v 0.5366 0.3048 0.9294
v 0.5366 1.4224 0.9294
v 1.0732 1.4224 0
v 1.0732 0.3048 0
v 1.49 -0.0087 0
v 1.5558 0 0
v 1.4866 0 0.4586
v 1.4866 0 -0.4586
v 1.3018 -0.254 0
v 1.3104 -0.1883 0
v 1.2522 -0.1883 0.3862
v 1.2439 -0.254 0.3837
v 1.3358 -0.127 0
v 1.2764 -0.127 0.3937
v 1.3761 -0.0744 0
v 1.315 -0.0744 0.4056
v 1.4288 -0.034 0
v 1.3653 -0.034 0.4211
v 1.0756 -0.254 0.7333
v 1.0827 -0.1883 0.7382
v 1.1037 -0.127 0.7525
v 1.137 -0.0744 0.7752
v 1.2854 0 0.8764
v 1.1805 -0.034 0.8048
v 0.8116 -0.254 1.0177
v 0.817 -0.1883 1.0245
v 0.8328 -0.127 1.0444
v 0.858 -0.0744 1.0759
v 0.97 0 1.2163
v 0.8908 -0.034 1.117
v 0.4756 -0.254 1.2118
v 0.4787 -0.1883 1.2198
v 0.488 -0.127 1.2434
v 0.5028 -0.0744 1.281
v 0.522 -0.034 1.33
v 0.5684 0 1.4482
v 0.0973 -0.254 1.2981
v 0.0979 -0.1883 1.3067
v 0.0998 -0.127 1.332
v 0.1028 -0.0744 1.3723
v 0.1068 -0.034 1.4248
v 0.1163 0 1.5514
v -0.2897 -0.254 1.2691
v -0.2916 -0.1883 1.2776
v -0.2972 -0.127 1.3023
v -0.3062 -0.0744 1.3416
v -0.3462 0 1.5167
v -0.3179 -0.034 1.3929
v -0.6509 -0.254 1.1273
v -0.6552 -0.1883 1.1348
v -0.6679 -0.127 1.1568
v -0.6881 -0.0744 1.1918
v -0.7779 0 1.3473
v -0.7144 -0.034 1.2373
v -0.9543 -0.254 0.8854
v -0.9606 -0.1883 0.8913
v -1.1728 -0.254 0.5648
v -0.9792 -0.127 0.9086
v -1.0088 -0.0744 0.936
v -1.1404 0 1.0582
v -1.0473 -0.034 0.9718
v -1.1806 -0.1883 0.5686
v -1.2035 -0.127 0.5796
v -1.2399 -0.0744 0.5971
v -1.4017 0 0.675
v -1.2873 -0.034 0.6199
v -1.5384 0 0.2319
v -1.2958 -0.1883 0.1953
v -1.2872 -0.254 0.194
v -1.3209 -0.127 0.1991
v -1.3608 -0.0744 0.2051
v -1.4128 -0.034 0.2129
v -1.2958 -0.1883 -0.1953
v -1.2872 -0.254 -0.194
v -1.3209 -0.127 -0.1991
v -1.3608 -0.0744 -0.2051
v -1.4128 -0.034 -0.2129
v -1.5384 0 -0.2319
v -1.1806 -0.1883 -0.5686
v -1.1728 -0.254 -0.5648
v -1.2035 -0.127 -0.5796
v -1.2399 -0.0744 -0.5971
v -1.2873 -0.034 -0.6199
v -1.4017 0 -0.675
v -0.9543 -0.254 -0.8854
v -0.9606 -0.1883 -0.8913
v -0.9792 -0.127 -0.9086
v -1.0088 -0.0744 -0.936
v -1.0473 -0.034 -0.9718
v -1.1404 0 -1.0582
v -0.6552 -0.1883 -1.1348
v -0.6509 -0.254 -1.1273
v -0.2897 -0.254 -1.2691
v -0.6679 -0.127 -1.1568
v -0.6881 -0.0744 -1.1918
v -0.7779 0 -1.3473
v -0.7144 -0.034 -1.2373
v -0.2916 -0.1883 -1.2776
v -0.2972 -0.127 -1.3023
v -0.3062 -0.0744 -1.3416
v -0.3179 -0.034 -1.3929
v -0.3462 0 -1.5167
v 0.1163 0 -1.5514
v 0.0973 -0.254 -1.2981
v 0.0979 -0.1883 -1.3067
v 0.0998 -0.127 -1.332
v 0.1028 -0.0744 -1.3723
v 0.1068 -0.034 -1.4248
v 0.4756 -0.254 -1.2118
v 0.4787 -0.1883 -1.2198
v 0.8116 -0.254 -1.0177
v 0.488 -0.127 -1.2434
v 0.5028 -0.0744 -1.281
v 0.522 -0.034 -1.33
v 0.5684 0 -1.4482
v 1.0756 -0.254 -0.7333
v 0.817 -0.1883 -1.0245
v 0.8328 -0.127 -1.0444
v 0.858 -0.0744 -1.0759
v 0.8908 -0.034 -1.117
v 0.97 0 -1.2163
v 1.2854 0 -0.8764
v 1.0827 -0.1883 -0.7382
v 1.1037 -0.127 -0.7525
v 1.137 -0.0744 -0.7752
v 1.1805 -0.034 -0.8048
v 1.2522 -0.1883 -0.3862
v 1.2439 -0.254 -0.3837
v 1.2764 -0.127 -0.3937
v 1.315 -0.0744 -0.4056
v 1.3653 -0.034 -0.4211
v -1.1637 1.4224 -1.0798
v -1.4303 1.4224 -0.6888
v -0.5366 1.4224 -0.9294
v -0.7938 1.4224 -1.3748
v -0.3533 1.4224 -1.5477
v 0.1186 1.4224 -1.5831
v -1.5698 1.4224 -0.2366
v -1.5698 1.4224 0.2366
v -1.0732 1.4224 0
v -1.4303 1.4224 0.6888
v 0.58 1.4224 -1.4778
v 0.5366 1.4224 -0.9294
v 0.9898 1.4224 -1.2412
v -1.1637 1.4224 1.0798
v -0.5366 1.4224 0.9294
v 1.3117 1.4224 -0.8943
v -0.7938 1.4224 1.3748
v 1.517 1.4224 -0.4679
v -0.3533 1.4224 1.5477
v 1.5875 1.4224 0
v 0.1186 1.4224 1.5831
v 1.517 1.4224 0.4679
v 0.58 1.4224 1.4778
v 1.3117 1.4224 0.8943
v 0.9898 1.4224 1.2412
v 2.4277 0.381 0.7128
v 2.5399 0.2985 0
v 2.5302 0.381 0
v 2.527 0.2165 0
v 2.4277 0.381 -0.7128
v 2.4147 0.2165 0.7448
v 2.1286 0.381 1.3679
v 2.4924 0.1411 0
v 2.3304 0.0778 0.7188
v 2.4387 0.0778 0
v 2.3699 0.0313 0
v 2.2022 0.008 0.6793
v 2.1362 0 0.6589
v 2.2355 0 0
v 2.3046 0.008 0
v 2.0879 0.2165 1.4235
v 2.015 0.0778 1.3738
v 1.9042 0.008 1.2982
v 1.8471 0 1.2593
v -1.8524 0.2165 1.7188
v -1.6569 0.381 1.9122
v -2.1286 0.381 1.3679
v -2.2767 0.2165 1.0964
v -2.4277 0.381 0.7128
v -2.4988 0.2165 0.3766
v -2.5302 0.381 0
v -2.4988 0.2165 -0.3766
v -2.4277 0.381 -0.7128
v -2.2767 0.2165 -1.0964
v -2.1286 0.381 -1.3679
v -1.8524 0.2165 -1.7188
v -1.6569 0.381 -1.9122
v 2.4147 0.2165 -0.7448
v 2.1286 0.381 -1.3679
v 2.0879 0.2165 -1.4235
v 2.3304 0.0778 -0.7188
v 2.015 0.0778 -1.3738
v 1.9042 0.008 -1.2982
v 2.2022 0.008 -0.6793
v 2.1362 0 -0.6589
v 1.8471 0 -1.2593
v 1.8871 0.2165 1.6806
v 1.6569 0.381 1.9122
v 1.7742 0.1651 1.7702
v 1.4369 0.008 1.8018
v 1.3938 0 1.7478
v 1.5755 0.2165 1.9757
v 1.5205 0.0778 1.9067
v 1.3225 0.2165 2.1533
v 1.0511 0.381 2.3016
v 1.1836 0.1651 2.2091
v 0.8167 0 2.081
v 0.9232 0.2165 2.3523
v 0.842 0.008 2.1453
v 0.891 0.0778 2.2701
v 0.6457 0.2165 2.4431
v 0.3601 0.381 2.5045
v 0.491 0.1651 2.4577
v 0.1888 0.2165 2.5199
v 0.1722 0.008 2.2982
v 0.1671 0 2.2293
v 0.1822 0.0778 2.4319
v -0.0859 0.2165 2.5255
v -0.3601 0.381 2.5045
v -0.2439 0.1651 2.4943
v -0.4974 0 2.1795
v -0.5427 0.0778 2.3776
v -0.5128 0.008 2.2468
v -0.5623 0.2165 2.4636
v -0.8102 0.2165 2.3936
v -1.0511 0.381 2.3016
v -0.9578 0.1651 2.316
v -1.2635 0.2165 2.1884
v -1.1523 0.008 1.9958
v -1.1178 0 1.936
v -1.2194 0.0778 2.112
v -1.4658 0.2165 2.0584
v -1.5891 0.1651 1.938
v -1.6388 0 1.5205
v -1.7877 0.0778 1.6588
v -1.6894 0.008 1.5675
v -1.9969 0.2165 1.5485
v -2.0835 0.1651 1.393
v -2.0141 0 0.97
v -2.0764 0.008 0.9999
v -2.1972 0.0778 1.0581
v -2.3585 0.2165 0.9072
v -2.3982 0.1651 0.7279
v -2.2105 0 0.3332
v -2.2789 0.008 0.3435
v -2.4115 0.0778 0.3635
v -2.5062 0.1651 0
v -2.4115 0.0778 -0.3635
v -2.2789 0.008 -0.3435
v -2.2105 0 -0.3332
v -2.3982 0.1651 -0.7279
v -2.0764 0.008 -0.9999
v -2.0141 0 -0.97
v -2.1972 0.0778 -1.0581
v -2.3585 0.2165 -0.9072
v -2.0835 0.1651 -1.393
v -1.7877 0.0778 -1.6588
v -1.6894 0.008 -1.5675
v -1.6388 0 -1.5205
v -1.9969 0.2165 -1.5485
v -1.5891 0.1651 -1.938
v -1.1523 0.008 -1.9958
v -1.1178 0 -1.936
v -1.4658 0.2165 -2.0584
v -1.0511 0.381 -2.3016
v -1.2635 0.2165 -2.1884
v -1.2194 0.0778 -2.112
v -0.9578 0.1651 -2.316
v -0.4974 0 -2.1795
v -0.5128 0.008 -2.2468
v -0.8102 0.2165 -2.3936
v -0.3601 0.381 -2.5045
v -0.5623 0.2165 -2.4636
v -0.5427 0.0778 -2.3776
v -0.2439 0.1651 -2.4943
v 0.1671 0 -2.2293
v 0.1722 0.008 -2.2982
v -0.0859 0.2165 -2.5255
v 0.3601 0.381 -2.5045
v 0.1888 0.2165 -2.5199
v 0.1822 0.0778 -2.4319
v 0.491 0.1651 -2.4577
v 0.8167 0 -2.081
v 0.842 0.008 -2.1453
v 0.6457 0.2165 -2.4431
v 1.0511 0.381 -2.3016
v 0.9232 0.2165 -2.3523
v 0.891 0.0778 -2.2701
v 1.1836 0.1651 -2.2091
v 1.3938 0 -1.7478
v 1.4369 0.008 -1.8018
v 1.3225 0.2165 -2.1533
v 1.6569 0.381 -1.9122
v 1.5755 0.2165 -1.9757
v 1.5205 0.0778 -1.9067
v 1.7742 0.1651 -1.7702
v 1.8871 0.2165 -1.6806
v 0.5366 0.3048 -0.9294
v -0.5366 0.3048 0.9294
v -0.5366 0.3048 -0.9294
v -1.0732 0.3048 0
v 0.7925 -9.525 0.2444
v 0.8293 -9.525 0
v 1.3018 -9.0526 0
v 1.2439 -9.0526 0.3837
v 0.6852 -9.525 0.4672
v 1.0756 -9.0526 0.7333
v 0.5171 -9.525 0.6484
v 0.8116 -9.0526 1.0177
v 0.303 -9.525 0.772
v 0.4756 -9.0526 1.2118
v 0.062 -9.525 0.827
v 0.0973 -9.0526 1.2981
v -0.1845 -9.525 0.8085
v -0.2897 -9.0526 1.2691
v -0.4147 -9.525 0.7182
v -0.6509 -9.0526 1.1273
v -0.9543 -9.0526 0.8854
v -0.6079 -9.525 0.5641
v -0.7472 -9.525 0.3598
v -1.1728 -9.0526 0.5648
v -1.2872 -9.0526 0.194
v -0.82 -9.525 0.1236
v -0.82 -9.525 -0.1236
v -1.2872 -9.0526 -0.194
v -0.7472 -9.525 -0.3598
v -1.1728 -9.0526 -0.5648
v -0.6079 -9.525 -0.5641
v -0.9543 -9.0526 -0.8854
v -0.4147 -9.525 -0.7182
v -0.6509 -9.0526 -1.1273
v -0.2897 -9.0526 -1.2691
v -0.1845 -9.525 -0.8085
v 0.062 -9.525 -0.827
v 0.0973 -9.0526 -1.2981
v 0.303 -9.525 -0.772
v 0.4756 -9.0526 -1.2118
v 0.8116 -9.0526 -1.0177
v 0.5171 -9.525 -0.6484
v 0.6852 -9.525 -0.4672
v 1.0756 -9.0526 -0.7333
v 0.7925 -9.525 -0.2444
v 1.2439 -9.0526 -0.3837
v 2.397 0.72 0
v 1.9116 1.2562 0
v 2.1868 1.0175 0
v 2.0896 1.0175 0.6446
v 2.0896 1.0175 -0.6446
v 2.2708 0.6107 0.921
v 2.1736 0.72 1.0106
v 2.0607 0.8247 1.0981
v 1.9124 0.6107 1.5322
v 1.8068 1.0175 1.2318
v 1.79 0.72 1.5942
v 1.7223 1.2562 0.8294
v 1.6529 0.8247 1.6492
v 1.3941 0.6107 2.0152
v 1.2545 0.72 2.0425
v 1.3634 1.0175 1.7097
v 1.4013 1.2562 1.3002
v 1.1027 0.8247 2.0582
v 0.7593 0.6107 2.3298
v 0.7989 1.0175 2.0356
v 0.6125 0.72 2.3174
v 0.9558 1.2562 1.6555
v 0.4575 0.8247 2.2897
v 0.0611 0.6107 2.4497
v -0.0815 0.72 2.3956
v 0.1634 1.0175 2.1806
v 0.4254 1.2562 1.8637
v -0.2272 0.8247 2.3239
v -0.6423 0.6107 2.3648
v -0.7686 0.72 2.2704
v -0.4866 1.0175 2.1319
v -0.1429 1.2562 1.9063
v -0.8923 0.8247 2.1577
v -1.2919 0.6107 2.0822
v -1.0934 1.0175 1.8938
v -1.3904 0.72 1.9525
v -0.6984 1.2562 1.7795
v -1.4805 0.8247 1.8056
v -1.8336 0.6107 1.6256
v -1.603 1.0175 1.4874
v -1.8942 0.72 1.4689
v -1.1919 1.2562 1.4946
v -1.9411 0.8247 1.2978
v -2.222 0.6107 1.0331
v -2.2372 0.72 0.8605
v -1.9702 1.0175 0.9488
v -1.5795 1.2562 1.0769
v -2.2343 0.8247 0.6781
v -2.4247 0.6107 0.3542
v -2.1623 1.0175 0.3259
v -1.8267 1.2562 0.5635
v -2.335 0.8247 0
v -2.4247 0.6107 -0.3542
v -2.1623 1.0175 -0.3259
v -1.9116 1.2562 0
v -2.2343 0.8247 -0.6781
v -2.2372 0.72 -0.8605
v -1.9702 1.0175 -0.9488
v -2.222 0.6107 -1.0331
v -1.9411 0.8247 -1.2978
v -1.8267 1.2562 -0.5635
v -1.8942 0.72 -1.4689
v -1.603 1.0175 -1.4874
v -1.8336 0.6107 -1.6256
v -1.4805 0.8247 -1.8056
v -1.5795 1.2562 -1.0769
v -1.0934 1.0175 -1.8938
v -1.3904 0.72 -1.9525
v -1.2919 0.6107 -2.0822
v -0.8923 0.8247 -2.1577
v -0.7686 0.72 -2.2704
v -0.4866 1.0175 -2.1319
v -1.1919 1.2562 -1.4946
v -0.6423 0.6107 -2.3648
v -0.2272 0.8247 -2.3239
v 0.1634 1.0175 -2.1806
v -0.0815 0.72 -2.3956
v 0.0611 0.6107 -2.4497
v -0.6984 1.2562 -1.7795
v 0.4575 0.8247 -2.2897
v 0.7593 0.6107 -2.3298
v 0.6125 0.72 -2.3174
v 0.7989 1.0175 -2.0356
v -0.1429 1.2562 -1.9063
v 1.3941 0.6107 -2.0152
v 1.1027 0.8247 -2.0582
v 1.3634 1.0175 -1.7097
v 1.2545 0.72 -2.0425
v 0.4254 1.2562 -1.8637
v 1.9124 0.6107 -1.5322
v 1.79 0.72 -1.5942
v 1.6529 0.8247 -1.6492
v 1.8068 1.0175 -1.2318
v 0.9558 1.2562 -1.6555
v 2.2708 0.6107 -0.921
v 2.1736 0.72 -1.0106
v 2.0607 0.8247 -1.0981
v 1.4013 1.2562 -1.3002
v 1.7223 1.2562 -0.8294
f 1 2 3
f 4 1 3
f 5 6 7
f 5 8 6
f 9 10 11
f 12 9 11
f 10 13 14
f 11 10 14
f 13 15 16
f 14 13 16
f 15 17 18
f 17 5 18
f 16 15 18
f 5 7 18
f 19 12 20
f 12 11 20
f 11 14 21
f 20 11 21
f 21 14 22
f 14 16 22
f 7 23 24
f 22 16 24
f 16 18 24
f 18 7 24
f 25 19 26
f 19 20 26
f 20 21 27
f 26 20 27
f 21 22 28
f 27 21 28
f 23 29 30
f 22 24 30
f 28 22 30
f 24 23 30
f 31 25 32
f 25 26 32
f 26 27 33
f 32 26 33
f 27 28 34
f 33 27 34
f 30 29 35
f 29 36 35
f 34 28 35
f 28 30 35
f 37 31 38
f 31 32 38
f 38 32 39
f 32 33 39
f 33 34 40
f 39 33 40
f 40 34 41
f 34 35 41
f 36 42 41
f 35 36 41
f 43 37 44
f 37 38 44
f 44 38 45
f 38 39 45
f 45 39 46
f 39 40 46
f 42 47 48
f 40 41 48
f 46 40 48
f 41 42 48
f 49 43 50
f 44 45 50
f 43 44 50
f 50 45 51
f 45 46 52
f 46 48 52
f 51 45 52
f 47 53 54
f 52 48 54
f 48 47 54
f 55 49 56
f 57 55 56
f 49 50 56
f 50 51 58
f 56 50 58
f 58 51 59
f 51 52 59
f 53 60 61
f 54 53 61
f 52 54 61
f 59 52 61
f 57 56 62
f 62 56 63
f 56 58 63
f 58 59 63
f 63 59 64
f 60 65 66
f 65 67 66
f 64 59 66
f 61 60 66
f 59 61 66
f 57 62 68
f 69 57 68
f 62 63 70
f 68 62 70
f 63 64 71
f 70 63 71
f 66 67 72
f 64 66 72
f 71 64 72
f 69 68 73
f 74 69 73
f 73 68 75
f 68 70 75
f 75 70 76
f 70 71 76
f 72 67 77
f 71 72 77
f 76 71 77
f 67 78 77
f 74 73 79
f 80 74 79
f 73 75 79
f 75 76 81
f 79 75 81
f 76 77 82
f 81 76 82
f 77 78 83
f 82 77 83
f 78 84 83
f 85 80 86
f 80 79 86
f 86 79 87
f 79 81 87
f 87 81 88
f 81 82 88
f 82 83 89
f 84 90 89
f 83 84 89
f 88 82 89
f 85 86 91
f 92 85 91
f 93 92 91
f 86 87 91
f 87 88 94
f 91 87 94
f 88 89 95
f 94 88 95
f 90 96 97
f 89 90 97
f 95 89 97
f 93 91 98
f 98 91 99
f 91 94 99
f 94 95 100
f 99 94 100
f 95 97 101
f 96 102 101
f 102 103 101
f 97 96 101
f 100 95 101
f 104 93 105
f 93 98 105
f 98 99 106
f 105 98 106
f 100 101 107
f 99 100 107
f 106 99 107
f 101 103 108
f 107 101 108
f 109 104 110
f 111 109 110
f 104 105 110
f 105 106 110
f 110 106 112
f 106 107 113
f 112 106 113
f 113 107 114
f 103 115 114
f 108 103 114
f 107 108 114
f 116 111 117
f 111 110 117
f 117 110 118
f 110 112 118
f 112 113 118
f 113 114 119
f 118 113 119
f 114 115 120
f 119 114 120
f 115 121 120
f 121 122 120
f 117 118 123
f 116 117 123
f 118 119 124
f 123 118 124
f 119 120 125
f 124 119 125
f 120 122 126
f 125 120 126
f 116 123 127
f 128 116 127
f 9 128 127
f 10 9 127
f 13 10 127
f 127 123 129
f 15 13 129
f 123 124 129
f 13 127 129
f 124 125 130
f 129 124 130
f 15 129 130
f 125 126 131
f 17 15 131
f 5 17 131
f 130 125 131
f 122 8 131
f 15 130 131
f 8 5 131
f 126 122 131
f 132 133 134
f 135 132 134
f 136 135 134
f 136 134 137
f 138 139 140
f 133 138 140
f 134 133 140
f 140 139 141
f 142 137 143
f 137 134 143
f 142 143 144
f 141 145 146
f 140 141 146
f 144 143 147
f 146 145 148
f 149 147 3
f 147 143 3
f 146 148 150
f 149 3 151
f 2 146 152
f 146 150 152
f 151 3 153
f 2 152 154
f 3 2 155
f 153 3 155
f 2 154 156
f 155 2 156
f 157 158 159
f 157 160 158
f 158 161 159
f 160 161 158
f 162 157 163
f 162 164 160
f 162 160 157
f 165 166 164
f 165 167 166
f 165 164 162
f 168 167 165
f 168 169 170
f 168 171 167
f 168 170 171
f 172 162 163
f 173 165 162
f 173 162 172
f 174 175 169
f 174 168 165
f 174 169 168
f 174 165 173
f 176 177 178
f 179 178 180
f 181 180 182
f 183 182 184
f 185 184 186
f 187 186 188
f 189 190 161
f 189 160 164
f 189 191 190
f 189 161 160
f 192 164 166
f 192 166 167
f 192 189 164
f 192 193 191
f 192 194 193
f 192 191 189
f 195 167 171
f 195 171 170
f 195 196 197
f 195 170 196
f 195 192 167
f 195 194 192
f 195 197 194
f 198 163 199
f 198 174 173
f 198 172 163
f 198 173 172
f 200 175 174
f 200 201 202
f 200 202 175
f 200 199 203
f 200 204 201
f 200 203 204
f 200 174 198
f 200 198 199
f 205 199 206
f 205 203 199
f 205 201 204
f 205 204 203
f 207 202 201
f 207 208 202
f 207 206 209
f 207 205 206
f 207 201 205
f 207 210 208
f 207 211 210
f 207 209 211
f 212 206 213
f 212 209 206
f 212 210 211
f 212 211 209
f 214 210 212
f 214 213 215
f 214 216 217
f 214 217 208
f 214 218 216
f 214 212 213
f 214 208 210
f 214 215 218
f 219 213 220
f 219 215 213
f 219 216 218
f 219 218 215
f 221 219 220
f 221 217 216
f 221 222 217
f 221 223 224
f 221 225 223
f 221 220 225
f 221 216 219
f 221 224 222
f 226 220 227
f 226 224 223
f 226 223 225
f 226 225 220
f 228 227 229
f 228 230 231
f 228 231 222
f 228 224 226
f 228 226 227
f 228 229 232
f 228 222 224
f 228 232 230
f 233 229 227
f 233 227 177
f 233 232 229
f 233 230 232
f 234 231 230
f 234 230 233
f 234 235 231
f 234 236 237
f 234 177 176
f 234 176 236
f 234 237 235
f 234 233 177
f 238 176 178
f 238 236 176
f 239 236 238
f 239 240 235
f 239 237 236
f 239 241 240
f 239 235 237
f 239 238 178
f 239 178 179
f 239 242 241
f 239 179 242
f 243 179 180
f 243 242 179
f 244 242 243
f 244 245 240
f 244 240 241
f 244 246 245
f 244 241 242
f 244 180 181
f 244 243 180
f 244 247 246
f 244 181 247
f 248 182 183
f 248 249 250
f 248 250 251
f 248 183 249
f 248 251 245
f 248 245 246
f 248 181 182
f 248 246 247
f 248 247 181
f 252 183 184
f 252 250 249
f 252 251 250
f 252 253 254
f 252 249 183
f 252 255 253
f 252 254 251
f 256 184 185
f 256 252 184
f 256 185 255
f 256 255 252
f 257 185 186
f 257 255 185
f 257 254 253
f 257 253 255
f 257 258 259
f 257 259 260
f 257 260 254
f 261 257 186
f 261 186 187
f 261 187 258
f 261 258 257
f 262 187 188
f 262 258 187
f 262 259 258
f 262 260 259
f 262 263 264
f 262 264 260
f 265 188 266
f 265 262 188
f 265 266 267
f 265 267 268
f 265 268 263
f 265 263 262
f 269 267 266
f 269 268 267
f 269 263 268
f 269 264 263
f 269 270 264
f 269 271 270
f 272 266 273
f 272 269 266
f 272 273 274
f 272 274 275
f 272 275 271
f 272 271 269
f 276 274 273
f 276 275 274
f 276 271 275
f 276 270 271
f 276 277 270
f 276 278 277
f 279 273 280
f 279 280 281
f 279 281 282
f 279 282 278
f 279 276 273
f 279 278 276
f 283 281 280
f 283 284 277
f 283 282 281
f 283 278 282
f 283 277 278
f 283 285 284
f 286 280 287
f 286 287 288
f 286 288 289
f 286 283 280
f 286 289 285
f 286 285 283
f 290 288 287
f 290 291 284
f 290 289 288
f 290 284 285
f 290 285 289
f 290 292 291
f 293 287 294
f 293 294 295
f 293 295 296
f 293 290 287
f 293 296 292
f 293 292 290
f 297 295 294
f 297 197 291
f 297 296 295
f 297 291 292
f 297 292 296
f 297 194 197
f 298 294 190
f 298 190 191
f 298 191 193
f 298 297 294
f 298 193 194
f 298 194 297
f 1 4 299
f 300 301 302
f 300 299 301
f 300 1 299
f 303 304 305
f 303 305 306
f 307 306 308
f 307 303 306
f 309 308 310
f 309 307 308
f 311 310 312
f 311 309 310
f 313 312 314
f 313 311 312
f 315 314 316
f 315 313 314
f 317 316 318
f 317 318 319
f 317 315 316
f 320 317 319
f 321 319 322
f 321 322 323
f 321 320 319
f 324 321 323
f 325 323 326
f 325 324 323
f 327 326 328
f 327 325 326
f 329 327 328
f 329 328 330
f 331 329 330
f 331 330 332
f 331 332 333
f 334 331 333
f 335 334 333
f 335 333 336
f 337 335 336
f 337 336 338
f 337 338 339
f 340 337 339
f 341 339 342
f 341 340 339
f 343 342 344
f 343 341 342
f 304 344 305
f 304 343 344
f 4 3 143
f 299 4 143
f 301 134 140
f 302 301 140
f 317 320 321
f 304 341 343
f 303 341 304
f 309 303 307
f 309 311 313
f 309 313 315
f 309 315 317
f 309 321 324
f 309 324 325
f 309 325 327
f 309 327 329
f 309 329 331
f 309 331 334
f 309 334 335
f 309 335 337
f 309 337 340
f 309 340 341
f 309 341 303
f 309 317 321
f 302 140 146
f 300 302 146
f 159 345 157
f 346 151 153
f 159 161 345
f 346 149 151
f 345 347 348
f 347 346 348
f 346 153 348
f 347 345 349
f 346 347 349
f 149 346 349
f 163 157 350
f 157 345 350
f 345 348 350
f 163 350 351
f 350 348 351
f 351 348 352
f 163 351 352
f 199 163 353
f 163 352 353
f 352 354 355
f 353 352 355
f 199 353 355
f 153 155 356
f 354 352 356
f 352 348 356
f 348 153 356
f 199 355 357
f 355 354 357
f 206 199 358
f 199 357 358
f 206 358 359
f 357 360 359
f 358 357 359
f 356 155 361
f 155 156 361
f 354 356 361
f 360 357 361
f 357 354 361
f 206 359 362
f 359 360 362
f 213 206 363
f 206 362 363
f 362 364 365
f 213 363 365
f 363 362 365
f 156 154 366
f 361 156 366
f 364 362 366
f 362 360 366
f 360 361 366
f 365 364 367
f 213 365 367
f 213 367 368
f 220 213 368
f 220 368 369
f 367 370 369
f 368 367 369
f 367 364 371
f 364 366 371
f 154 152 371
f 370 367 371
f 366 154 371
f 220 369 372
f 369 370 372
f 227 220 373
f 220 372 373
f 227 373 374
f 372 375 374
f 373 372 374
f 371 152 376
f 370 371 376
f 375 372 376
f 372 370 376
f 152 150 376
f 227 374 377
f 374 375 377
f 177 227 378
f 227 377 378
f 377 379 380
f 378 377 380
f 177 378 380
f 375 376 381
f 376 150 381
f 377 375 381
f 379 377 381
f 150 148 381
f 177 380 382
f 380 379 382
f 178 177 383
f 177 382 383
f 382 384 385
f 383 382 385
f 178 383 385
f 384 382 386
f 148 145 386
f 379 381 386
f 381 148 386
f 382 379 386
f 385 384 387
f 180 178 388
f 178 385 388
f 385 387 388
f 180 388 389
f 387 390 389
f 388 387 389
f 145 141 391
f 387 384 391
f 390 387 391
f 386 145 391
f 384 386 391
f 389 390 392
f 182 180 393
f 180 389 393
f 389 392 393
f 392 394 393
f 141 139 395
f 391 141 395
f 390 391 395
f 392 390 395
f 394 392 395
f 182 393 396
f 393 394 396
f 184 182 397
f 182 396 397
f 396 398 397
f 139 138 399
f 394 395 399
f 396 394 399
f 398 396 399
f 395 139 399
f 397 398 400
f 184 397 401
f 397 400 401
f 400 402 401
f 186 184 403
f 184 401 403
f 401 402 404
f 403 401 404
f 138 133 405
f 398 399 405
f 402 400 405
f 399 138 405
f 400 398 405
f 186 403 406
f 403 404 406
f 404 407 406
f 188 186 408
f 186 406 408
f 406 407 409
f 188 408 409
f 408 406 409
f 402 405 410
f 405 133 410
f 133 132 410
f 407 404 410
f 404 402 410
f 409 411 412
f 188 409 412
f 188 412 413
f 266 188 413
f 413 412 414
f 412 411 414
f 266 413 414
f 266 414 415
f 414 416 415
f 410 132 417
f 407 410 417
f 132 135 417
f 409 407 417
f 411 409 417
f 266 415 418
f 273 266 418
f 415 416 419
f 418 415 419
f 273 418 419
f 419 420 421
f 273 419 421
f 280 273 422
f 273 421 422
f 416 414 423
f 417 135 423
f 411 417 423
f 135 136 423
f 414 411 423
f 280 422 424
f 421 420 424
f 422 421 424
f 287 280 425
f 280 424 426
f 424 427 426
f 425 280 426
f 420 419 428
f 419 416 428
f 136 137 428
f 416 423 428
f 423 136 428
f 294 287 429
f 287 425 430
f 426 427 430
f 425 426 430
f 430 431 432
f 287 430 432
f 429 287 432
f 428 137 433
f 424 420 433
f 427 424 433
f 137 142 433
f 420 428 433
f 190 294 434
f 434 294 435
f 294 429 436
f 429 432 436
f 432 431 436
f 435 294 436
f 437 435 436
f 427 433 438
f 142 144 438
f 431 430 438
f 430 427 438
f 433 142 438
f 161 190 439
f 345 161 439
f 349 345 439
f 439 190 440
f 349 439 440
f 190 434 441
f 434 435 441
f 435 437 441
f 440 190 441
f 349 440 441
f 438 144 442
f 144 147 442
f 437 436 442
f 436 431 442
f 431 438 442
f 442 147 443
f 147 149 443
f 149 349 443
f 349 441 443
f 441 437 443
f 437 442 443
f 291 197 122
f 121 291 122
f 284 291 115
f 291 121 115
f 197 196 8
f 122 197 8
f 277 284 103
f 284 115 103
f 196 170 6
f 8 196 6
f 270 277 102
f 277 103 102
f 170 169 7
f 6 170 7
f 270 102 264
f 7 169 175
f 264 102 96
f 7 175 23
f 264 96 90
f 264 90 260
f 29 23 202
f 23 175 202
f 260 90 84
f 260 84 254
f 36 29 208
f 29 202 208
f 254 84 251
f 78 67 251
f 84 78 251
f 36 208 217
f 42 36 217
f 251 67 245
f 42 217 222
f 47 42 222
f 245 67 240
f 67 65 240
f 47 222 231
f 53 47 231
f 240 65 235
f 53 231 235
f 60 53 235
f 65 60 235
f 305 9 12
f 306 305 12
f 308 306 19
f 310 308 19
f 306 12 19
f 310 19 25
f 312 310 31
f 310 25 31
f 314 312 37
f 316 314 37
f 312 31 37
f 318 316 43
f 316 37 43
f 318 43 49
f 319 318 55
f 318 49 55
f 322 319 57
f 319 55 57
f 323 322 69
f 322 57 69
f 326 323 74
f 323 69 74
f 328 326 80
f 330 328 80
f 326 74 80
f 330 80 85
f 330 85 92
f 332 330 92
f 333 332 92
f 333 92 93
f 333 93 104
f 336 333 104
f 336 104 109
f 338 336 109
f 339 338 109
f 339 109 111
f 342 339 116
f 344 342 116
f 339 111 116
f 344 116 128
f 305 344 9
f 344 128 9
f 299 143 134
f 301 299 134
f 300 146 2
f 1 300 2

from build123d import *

# Parameters (mm, degrees)
SKETCH2_R           = 1.30175
BOSS_EXTRUDE1_DEPTH = 9.525
CUT_EXTRUDE1_DEPTH  = 1.1176
CHAMFER1_SIZE       = 0.47244
FILLET1_R           = 0.254


with BuildPart() as part:
    # Sketch1 → Revolve1 (revolve)
    with BuildSketch(Plane.XY):
        with BuildLine():
            Line((1.5875, 1.4224), (0, 1.4224))
            Line((0, 1.4224), (0, 0))
            Line((0, 0), (2.235517502, 0))
            add(Edge.make_bspline(
                [(2.530228655, 0.381), (2.538792783, 0.348014811), (2.541780076, 0.313096126), (2.538943152, 0.279135577), (2.536106229, 0.245175028), (2.527366844, 0.211235941), (2.513448709, 0.180128827), (2.499530575, 0.149021713), (2.480049812, 0.119888598), (2.456619631, 0.09514201), (2.433189451, 0.070395421), (2.405163618, 0.049352817), (2.374862966, 0.033756745), (2.344562313, 0.018160672), (2.311151111, 0.007580973), (2.277396156, 0.002893755), (2.263536304, 0.000969174), (2.249510339, 0), (2.235517502, 0)],
                knots=[0, 0, 0, 0, 0.000102237, 0.000102237, 0.000102237, 0.000204473, 0.000204473, 0.000204473, 0.00030671, 0.00030671, 0.00030671, 0.000408946, 0.000408946, 0.000408946, 0.000511183, 0.000511183, 0.000511183, 0.000552664, 0.000552664, 0.000552664, 0.000552664], degree=3))
            ThreePointArc((2.530228655, 0.381), (2.18675257, 1.017470992), (1.5875, 1.4224))
        make_face()
    revolve(axis=Axis((0, 1.4224, 0), (0, -1, 0)))

    # Sketch2 → Boss-Extrude1 (add)
    with BuildSketch(Plane.XZ):
        Circle(SKETCH2_R)
    extrude(amount=BOSS_EXTRUDE1_DEPTH)

    # Sketch3 → Cut-Extrude1 (cut)
    with BuildSketch(Plane(origin=(0, 1.4224, 0), x_dir=(-1, 0, 0), z_dir=(0, 1, 0))):
        Polygon((0.536575, -0.929375162), (1.07315, 0), (0.536575, 0.929375162), (-0.536575, 0.929375162), (-1.07315, 0), (-0.536575, -0.929375162), align=None)
    extrude(amount=-CUT_EXTRUDE1_DEPTH, mode=Mode.SUBTRACT)

    # Chamfer1
    chamfer1_edges = [part.edges().sort_by_distance(p)[0] for p in [
        (-1.30175, -9.525, 0),
    ]]
    chamfer(chamfer1_edges, length=CHAMFER1_SIZE)

    # Fillet1
    fillet1_edges = [part.edges().sort_by_distance(p)[0] for p in [
        (-1.30175, 0, 0),
    ]]
    fillet(fillet1_edges, radius=FILLET1_R)


solid = part.part
